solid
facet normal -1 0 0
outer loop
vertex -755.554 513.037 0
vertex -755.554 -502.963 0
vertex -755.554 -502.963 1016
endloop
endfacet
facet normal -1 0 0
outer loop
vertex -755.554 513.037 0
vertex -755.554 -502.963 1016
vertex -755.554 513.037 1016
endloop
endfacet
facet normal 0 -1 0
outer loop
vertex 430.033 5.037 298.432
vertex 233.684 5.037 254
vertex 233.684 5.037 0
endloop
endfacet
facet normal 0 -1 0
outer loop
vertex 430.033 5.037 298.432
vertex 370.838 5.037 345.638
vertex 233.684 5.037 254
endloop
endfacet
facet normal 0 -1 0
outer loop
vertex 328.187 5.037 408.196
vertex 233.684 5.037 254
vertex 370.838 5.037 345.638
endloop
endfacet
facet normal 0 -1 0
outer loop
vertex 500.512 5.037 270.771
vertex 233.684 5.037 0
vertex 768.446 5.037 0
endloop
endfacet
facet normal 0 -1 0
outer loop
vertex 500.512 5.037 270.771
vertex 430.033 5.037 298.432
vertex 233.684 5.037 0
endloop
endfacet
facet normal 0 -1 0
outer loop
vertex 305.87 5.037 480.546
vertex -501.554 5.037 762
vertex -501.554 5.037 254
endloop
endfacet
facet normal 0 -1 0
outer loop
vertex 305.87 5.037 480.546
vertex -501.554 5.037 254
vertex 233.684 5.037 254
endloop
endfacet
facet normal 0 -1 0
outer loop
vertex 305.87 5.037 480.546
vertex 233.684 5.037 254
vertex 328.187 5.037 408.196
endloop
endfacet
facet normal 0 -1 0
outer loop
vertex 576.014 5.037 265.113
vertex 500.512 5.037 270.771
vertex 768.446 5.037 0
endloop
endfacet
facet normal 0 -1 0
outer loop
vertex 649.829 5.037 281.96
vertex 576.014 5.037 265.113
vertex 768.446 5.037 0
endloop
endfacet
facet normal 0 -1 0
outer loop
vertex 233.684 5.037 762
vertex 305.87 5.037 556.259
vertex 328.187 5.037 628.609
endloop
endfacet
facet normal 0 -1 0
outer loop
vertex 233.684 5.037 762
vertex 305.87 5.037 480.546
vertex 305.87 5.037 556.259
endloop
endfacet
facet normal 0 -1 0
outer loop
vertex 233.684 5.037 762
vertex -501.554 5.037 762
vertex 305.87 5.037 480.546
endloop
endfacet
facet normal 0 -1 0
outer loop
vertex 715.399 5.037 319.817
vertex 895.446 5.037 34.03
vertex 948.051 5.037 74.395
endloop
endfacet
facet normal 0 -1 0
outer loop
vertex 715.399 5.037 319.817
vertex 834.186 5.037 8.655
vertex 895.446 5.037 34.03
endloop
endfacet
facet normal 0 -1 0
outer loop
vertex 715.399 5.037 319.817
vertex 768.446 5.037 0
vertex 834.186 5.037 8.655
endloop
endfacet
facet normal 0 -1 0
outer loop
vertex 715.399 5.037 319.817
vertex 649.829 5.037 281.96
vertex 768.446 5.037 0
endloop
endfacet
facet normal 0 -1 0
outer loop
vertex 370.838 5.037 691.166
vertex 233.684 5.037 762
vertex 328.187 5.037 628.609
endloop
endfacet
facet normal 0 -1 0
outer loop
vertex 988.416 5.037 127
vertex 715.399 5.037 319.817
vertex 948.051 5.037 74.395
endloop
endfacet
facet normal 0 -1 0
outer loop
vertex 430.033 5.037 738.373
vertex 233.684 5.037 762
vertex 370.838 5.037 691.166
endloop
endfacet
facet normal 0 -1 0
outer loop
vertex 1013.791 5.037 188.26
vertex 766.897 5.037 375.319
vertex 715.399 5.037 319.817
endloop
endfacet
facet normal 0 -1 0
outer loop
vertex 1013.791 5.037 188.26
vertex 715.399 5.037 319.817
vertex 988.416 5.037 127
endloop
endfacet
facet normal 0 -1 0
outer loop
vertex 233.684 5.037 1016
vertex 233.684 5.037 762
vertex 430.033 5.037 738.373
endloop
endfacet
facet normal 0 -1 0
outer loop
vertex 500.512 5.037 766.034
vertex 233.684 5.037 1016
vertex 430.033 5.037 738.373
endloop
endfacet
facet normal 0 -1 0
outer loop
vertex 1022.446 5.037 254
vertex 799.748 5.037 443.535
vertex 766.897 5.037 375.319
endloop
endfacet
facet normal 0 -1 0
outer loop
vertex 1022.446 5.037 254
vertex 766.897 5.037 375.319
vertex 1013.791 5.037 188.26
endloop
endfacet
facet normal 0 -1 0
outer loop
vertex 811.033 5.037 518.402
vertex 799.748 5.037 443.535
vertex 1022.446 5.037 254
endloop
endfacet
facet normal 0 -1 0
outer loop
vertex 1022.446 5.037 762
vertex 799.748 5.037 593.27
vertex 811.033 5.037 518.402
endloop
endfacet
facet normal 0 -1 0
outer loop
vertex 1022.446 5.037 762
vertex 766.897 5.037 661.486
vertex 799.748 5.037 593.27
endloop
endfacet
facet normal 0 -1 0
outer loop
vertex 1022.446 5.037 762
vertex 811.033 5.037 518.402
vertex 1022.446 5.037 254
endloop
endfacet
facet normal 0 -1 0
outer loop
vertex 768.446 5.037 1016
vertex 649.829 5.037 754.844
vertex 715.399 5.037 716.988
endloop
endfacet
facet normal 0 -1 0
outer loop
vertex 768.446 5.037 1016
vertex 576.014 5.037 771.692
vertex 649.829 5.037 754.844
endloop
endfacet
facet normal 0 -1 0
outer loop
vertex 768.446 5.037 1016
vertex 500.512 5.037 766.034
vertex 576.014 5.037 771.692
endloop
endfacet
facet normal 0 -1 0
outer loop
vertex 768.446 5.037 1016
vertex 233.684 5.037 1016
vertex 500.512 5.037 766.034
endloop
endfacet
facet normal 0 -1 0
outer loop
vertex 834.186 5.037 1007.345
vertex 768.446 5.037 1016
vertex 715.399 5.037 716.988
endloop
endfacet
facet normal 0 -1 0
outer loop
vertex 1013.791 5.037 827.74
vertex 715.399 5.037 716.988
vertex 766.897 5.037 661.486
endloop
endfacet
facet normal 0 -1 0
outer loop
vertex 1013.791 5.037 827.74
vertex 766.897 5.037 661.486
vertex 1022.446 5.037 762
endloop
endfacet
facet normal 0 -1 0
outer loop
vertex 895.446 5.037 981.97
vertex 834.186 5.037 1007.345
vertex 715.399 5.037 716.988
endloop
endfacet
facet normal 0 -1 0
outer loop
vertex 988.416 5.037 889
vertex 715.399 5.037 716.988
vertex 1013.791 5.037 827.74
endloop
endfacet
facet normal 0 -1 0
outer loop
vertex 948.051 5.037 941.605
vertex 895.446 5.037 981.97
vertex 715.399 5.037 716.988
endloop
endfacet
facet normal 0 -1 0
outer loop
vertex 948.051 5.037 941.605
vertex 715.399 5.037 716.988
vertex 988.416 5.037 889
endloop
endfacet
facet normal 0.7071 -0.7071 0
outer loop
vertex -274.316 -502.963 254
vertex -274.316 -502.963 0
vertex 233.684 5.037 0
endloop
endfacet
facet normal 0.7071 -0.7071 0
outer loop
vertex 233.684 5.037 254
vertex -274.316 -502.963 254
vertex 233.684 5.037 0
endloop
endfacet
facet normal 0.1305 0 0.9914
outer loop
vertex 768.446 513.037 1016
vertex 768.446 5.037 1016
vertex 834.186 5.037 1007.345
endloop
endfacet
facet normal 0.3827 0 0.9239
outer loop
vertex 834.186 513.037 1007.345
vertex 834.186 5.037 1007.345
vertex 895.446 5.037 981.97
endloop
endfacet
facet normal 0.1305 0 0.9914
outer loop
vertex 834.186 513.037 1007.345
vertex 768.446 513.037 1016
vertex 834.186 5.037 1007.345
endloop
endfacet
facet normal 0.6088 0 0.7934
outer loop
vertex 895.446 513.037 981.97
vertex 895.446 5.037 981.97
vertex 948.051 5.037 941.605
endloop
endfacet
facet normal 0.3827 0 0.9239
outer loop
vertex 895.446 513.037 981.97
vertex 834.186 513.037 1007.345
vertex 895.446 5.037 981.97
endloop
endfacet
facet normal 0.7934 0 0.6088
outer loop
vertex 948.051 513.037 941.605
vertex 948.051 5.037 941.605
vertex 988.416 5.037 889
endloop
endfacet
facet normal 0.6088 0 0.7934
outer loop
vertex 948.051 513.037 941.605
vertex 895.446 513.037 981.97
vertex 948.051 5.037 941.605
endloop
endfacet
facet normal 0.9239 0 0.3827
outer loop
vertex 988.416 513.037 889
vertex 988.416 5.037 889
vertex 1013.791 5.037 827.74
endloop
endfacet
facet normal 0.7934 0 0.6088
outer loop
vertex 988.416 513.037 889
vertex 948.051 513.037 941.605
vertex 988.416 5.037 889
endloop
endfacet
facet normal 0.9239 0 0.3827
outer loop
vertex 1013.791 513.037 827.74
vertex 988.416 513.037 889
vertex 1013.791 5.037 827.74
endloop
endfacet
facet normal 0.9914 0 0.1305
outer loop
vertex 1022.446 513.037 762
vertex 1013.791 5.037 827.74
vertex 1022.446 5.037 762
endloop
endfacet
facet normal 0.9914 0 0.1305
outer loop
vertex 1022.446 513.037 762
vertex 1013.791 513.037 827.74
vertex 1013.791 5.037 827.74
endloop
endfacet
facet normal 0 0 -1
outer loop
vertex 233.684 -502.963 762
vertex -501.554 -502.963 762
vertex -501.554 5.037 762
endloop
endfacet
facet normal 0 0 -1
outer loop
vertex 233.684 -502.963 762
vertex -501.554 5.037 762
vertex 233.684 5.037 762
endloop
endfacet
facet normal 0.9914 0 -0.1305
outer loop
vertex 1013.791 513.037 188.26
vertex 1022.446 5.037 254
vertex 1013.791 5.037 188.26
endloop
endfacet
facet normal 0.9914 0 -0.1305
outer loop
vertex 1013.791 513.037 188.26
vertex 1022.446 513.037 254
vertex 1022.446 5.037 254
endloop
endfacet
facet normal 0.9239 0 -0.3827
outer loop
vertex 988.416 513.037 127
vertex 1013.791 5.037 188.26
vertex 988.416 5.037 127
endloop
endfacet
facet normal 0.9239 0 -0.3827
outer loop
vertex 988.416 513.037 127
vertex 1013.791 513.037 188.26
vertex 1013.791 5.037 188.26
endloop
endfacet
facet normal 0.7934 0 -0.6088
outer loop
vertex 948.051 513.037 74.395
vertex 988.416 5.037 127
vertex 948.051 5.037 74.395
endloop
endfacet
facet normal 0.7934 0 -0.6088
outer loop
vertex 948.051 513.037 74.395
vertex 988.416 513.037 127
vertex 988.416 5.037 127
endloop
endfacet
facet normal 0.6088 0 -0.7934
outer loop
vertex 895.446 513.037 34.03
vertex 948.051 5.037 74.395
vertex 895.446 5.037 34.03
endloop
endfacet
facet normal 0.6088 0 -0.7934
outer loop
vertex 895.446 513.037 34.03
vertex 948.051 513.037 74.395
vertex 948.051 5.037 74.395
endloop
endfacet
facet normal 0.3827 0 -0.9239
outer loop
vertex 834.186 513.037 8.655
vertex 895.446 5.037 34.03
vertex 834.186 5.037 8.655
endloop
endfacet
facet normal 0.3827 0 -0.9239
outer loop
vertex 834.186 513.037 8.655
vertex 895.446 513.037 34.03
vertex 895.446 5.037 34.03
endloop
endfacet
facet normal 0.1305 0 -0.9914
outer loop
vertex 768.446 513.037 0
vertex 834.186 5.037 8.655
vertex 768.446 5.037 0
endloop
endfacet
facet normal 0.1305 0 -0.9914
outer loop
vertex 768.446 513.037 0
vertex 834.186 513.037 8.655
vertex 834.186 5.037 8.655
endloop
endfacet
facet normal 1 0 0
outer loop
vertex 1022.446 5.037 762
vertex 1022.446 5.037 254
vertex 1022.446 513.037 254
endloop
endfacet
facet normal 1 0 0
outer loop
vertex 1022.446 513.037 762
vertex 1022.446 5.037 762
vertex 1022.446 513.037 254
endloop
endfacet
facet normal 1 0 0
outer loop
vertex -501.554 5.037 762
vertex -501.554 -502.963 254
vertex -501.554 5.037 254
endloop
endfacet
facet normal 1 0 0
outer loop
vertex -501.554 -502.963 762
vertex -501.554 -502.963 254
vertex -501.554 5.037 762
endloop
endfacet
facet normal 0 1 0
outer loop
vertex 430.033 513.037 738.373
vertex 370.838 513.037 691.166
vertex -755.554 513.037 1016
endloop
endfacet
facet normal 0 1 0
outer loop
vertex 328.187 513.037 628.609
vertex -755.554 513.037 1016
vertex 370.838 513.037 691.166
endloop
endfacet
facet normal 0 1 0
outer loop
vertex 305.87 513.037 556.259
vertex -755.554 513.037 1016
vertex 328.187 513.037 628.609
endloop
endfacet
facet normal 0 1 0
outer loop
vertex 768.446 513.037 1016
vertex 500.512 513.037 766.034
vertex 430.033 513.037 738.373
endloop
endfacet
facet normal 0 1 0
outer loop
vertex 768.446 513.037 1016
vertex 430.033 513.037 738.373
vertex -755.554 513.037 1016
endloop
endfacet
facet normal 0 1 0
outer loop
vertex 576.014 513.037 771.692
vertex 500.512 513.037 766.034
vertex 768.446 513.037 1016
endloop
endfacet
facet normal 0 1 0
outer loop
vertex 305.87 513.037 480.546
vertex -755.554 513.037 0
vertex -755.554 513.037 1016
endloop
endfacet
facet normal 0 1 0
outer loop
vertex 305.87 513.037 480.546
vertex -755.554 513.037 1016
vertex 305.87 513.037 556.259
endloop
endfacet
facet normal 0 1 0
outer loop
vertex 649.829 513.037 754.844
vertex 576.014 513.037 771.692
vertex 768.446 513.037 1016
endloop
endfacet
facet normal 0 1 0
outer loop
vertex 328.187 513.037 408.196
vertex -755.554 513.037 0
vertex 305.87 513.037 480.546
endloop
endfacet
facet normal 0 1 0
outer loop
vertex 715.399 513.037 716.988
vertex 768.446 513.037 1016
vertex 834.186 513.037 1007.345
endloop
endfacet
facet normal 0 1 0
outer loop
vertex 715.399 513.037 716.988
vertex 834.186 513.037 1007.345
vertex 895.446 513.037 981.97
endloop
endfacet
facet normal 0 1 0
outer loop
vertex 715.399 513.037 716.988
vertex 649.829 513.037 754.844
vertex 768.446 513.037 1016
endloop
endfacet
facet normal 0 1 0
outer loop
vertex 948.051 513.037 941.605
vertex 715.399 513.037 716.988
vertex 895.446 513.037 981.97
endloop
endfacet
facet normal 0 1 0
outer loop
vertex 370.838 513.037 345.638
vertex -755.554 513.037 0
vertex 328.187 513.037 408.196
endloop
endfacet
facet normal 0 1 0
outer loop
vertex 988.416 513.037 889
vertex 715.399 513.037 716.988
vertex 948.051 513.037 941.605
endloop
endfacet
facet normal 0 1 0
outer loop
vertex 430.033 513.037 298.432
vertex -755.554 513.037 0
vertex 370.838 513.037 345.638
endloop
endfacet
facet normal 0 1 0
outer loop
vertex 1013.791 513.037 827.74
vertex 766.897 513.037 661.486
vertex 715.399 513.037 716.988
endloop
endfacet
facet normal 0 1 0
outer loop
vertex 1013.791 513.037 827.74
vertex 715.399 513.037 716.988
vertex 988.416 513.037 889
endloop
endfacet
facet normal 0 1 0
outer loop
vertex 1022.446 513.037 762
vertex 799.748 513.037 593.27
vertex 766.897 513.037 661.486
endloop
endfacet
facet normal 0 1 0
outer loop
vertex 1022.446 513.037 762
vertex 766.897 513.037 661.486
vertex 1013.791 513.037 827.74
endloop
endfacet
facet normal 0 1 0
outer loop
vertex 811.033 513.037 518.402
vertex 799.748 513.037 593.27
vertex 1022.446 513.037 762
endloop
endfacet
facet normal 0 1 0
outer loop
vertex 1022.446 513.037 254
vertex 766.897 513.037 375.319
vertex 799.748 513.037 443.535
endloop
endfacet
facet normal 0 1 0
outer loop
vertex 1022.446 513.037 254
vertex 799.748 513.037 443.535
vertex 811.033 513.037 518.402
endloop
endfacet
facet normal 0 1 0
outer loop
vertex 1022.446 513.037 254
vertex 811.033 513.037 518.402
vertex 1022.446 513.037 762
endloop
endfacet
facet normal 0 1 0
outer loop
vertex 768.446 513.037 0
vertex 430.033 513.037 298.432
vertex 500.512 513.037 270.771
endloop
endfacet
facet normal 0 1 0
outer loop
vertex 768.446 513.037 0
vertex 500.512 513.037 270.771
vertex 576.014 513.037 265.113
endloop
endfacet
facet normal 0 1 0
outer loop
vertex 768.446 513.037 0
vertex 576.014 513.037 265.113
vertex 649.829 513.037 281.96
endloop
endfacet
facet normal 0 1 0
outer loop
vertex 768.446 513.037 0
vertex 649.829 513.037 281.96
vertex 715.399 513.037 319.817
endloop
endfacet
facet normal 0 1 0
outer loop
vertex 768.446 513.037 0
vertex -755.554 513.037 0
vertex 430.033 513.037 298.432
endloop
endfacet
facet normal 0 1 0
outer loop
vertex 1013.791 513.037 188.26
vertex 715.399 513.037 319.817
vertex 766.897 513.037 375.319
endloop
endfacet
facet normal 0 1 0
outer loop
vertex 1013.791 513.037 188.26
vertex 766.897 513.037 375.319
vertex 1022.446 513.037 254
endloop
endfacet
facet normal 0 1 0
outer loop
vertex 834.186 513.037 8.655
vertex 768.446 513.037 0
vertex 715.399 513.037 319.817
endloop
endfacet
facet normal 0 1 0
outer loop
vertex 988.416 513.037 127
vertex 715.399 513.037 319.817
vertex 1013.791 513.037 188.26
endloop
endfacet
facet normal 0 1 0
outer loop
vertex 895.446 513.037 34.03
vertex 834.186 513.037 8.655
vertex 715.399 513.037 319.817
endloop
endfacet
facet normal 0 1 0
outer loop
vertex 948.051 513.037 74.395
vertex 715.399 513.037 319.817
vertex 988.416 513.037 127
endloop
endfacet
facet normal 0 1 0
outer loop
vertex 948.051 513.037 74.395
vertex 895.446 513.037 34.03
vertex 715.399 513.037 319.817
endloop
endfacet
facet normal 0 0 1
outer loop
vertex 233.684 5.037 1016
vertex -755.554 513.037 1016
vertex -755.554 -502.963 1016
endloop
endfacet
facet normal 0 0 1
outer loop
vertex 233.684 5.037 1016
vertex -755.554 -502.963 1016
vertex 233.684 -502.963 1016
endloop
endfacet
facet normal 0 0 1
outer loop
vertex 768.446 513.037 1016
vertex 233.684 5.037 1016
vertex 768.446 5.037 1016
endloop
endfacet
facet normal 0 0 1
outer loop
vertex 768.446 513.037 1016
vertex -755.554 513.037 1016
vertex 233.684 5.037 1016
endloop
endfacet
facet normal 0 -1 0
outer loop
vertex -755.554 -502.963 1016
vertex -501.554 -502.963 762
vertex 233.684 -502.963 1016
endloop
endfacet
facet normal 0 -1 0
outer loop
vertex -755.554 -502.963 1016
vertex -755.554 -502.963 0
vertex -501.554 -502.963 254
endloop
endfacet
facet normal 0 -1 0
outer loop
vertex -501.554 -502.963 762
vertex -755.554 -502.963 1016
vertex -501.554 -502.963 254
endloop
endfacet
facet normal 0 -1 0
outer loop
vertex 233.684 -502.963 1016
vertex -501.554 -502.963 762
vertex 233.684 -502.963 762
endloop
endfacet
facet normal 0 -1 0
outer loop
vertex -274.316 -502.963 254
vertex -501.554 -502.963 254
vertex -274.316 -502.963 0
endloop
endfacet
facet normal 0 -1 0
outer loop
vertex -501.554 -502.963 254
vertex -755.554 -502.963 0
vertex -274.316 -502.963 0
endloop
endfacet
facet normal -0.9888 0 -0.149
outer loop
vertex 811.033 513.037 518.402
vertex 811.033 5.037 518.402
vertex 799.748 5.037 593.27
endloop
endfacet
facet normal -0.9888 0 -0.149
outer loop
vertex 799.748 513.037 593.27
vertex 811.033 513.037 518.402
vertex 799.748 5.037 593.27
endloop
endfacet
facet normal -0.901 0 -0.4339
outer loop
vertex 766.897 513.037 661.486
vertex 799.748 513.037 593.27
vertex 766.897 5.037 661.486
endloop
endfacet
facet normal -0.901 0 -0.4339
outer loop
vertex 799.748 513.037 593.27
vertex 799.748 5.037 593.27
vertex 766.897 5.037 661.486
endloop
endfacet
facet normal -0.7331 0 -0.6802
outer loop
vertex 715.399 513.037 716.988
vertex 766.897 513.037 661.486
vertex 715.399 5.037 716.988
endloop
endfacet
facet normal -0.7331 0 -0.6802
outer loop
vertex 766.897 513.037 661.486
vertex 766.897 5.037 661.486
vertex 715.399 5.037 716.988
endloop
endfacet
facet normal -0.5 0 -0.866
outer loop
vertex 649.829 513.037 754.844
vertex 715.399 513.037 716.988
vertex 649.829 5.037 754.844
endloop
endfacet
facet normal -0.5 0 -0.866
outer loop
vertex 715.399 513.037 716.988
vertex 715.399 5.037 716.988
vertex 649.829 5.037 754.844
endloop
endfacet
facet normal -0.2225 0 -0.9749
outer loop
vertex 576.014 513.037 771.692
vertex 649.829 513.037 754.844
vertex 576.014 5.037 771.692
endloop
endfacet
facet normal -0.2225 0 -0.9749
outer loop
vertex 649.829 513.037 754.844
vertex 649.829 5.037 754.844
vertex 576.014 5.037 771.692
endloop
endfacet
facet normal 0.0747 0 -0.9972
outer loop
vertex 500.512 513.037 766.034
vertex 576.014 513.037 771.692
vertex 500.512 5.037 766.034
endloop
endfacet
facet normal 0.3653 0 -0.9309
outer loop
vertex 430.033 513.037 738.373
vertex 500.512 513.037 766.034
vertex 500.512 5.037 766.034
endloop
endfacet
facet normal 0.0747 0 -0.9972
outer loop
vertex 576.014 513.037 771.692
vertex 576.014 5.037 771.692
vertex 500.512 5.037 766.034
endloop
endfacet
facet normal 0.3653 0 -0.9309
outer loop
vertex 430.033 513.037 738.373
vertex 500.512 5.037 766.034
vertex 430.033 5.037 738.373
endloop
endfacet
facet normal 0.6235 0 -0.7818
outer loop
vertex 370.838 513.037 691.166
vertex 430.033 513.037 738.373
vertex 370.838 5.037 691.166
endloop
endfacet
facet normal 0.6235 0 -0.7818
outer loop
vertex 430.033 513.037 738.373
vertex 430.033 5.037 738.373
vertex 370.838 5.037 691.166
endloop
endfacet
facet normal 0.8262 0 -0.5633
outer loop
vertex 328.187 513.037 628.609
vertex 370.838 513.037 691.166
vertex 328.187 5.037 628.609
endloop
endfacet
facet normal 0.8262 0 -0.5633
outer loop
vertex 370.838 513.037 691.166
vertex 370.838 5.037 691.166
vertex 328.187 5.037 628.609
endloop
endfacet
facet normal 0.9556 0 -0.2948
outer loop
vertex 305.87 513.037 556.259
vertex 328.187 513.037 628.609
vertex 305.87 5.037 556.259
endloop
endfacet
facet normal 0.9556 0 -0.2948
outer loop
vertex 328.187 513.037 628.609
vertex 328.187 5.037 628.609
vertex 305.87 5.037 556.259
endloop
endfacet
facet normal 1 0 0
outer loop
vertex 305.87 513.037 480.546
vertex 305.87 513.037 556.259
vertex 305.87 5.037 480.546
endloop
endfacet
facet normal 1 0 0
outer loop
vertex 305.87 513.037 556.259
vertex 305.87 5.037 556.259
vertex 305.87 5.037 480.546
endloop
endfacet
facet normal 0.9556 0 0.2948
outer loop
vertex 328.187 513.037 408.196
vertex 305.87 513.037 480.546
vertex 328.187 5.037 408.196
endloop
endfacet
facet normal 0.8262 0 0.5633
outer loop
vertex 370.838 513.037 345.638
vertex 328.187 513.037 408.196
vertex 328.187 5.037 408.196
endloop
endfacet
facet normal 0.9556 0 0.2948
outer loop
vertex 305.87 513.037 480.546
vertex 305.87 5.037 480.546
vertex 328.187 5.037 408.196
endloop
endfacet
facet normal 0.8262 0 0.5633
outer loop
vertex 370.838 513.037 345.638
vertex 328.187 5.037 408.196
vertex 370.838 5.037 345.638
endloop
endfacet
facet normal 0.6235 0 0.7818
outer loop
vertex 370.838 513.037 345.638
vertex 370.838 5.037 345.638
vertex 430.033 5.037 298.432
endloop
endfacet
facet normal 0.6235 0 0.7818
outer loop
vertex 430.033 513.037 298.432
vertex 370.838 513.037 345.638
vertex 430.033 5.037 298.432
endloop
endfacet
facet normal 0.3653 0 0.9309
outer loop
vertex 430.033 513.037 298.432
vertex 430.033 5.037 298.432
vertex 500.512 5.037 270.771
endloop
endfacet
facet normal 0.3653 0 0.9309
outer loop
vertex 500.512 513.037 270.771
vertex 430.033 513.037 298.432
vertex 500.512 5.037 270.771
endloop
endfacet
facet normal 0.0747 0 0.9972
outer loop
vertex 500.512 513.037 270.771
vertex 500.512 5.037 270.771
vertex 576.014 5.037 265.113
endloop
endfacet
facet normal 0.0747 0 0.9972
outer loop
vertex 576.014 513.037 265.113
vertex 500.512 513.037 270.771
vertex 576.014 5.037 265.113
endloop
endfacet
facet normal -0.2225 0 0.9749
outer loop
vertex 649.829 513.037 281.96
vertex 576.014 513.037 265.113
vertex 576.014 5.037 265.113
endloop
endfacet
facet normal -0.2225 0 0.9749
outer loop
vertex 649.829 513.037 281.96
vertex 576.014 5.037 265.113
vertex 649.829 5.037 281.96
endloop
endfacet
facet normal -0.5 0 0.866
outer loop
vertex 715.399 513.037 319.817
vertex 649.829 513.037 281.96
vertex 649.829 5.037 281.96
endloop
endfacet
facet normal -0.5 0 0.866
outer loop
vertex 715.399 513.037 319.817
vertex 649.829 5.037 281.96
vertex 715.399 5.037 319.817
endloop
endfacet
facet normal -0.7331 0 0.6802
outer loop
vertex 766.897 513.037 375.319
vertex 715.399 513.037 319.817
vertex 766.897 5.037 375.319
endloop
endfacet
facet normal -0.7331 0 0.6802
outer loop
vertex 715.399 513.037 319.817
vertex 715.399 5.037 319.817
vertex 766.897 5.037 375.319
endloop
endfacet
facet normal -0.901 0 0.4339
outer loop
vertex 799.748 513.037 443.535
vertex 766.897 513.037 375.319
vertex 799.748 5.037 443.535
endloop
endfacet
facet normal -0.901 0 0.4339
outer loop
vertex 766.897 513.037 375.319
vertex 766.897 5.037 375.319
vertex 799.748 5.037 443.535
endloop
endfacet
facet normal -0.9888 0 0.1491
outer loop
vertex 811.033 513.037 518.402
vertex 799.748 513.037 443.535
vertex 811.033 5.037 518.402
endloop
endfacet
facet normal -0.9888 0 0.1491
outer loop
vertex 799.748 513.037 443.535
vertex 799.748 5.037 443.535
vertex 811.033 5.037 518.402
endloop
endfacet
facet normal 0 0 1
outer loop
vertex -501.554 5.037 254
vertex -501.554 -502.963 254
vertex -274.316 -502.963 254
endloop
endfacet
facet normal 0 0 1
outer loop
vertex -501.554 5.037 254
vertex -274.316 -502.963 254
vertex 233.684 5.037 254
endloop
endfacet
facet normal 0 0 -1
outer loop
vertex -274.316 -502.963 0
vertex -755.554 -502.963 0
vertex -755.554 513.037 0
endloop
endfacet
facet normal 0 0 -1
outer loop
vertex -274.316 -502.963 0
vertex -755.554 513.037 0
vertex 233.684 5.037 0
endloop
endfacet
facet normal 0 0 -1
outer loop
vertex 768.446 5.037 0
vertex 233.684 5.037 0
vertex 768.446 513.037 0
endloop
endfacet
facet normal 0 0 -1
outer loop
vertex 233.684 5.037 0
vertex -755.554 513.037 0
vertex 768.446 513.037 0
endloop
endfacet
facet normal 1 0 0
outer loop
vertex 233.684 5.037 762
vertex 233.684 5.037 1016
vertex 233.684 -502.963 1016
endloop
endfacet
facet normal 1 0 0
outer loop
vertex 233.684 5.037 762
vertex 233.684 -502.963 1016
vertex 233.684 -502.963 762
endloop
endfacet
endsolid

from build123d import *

# Parameters (mm, degrees)
F0_W      = 1778
F0_H      = 1016
F1_DEPTH  = 1016
F2_W      = 762
F2_H      = 508
F3_DEPTH  = 508
F4_W      = 26.7618985716
F4_H      = 508
F5_DEPTH  = 508
F6_R      = 254
F7_R      = 254
F8_R      = 254
F9_DEPTH  = 508
F11_DEPTH = 254


with BuildPart() as f1:
    # F0 (on Top) → F1 (new body)
    with BuildSketch(Plane.XY):
        with Locations((133.4459019247, 5.0370320678)):
            Rectangle(F0_W, F0_H)
    extrude(amount=F1_DEPTH)

    # F2 (on face) → F3 (cut)
    with BuildSketch(Plane.XZ.offset(502.9629679322)):
        with Locations((-120.5540980753, 508)):
            Rectangle(F2_W, F2_H)
    extrude(amount=-F3_DEPTH, mode=Mode.SUBTRACT)

    # F4 (on face) → F5 (cut)
    with BuildSketch(Plane.XZ.offset(502.9629679322)):
        with Locations((247.0649526389, 508)):
            Rectangle(F4_W, F4_H)
        Polygon((1022.4459019247, 1016), (233.6840033531, 1016), (233.6840033531, 762), (260.4459019247, 762), (260.4459019247, 254), (233.6840033531, 254), (233.6840033531, 0), (1022.4459019247, 0), align=None)
    extrude(amount=-F5_DEPTH, mode=Mode.SUBTRACT)

    # F6
    f6_edges = [f1.edges().sort_by_distance(p)[0] for p in [
        (1022.445902, 259.037032, 1016),
    ]]
    fillet(f6_edges, radius=F6_R)

    # F7
    f7_edges = [f1.edges().sort_by_distance(p)[0] for p in [
        (1022.445902, 259.037032, 0),
    ]]
    fillet(f7_edges, radius=F7_R)

    # F8 (on face) → F9 (cut)
    with BuildSketch(Plane.XZ.offset(-5.0370320678)):
        with Locations((557.0327043533, 518.402338028)):
            Circle(F8_R)
    extrude(amount=-F9_DEPTH, mode=Mode.SUBTRACT)

    # F10 (on face) → F11 (cut)
    with BuildSketch(Plane(origin=(0, 0, 0), x_dir=(1, 0, 0), z_dir=(0, 0, -1))):
        Polygon((233.6840033531, -5.0370320678), (233.6840033531, 502.9629679322), (-274.3159966469, 502.9629679322), align=None)
    extrude(amount=-F11_DEPTH, mode=Mode.SUBTRACT)


solid = f1.part
